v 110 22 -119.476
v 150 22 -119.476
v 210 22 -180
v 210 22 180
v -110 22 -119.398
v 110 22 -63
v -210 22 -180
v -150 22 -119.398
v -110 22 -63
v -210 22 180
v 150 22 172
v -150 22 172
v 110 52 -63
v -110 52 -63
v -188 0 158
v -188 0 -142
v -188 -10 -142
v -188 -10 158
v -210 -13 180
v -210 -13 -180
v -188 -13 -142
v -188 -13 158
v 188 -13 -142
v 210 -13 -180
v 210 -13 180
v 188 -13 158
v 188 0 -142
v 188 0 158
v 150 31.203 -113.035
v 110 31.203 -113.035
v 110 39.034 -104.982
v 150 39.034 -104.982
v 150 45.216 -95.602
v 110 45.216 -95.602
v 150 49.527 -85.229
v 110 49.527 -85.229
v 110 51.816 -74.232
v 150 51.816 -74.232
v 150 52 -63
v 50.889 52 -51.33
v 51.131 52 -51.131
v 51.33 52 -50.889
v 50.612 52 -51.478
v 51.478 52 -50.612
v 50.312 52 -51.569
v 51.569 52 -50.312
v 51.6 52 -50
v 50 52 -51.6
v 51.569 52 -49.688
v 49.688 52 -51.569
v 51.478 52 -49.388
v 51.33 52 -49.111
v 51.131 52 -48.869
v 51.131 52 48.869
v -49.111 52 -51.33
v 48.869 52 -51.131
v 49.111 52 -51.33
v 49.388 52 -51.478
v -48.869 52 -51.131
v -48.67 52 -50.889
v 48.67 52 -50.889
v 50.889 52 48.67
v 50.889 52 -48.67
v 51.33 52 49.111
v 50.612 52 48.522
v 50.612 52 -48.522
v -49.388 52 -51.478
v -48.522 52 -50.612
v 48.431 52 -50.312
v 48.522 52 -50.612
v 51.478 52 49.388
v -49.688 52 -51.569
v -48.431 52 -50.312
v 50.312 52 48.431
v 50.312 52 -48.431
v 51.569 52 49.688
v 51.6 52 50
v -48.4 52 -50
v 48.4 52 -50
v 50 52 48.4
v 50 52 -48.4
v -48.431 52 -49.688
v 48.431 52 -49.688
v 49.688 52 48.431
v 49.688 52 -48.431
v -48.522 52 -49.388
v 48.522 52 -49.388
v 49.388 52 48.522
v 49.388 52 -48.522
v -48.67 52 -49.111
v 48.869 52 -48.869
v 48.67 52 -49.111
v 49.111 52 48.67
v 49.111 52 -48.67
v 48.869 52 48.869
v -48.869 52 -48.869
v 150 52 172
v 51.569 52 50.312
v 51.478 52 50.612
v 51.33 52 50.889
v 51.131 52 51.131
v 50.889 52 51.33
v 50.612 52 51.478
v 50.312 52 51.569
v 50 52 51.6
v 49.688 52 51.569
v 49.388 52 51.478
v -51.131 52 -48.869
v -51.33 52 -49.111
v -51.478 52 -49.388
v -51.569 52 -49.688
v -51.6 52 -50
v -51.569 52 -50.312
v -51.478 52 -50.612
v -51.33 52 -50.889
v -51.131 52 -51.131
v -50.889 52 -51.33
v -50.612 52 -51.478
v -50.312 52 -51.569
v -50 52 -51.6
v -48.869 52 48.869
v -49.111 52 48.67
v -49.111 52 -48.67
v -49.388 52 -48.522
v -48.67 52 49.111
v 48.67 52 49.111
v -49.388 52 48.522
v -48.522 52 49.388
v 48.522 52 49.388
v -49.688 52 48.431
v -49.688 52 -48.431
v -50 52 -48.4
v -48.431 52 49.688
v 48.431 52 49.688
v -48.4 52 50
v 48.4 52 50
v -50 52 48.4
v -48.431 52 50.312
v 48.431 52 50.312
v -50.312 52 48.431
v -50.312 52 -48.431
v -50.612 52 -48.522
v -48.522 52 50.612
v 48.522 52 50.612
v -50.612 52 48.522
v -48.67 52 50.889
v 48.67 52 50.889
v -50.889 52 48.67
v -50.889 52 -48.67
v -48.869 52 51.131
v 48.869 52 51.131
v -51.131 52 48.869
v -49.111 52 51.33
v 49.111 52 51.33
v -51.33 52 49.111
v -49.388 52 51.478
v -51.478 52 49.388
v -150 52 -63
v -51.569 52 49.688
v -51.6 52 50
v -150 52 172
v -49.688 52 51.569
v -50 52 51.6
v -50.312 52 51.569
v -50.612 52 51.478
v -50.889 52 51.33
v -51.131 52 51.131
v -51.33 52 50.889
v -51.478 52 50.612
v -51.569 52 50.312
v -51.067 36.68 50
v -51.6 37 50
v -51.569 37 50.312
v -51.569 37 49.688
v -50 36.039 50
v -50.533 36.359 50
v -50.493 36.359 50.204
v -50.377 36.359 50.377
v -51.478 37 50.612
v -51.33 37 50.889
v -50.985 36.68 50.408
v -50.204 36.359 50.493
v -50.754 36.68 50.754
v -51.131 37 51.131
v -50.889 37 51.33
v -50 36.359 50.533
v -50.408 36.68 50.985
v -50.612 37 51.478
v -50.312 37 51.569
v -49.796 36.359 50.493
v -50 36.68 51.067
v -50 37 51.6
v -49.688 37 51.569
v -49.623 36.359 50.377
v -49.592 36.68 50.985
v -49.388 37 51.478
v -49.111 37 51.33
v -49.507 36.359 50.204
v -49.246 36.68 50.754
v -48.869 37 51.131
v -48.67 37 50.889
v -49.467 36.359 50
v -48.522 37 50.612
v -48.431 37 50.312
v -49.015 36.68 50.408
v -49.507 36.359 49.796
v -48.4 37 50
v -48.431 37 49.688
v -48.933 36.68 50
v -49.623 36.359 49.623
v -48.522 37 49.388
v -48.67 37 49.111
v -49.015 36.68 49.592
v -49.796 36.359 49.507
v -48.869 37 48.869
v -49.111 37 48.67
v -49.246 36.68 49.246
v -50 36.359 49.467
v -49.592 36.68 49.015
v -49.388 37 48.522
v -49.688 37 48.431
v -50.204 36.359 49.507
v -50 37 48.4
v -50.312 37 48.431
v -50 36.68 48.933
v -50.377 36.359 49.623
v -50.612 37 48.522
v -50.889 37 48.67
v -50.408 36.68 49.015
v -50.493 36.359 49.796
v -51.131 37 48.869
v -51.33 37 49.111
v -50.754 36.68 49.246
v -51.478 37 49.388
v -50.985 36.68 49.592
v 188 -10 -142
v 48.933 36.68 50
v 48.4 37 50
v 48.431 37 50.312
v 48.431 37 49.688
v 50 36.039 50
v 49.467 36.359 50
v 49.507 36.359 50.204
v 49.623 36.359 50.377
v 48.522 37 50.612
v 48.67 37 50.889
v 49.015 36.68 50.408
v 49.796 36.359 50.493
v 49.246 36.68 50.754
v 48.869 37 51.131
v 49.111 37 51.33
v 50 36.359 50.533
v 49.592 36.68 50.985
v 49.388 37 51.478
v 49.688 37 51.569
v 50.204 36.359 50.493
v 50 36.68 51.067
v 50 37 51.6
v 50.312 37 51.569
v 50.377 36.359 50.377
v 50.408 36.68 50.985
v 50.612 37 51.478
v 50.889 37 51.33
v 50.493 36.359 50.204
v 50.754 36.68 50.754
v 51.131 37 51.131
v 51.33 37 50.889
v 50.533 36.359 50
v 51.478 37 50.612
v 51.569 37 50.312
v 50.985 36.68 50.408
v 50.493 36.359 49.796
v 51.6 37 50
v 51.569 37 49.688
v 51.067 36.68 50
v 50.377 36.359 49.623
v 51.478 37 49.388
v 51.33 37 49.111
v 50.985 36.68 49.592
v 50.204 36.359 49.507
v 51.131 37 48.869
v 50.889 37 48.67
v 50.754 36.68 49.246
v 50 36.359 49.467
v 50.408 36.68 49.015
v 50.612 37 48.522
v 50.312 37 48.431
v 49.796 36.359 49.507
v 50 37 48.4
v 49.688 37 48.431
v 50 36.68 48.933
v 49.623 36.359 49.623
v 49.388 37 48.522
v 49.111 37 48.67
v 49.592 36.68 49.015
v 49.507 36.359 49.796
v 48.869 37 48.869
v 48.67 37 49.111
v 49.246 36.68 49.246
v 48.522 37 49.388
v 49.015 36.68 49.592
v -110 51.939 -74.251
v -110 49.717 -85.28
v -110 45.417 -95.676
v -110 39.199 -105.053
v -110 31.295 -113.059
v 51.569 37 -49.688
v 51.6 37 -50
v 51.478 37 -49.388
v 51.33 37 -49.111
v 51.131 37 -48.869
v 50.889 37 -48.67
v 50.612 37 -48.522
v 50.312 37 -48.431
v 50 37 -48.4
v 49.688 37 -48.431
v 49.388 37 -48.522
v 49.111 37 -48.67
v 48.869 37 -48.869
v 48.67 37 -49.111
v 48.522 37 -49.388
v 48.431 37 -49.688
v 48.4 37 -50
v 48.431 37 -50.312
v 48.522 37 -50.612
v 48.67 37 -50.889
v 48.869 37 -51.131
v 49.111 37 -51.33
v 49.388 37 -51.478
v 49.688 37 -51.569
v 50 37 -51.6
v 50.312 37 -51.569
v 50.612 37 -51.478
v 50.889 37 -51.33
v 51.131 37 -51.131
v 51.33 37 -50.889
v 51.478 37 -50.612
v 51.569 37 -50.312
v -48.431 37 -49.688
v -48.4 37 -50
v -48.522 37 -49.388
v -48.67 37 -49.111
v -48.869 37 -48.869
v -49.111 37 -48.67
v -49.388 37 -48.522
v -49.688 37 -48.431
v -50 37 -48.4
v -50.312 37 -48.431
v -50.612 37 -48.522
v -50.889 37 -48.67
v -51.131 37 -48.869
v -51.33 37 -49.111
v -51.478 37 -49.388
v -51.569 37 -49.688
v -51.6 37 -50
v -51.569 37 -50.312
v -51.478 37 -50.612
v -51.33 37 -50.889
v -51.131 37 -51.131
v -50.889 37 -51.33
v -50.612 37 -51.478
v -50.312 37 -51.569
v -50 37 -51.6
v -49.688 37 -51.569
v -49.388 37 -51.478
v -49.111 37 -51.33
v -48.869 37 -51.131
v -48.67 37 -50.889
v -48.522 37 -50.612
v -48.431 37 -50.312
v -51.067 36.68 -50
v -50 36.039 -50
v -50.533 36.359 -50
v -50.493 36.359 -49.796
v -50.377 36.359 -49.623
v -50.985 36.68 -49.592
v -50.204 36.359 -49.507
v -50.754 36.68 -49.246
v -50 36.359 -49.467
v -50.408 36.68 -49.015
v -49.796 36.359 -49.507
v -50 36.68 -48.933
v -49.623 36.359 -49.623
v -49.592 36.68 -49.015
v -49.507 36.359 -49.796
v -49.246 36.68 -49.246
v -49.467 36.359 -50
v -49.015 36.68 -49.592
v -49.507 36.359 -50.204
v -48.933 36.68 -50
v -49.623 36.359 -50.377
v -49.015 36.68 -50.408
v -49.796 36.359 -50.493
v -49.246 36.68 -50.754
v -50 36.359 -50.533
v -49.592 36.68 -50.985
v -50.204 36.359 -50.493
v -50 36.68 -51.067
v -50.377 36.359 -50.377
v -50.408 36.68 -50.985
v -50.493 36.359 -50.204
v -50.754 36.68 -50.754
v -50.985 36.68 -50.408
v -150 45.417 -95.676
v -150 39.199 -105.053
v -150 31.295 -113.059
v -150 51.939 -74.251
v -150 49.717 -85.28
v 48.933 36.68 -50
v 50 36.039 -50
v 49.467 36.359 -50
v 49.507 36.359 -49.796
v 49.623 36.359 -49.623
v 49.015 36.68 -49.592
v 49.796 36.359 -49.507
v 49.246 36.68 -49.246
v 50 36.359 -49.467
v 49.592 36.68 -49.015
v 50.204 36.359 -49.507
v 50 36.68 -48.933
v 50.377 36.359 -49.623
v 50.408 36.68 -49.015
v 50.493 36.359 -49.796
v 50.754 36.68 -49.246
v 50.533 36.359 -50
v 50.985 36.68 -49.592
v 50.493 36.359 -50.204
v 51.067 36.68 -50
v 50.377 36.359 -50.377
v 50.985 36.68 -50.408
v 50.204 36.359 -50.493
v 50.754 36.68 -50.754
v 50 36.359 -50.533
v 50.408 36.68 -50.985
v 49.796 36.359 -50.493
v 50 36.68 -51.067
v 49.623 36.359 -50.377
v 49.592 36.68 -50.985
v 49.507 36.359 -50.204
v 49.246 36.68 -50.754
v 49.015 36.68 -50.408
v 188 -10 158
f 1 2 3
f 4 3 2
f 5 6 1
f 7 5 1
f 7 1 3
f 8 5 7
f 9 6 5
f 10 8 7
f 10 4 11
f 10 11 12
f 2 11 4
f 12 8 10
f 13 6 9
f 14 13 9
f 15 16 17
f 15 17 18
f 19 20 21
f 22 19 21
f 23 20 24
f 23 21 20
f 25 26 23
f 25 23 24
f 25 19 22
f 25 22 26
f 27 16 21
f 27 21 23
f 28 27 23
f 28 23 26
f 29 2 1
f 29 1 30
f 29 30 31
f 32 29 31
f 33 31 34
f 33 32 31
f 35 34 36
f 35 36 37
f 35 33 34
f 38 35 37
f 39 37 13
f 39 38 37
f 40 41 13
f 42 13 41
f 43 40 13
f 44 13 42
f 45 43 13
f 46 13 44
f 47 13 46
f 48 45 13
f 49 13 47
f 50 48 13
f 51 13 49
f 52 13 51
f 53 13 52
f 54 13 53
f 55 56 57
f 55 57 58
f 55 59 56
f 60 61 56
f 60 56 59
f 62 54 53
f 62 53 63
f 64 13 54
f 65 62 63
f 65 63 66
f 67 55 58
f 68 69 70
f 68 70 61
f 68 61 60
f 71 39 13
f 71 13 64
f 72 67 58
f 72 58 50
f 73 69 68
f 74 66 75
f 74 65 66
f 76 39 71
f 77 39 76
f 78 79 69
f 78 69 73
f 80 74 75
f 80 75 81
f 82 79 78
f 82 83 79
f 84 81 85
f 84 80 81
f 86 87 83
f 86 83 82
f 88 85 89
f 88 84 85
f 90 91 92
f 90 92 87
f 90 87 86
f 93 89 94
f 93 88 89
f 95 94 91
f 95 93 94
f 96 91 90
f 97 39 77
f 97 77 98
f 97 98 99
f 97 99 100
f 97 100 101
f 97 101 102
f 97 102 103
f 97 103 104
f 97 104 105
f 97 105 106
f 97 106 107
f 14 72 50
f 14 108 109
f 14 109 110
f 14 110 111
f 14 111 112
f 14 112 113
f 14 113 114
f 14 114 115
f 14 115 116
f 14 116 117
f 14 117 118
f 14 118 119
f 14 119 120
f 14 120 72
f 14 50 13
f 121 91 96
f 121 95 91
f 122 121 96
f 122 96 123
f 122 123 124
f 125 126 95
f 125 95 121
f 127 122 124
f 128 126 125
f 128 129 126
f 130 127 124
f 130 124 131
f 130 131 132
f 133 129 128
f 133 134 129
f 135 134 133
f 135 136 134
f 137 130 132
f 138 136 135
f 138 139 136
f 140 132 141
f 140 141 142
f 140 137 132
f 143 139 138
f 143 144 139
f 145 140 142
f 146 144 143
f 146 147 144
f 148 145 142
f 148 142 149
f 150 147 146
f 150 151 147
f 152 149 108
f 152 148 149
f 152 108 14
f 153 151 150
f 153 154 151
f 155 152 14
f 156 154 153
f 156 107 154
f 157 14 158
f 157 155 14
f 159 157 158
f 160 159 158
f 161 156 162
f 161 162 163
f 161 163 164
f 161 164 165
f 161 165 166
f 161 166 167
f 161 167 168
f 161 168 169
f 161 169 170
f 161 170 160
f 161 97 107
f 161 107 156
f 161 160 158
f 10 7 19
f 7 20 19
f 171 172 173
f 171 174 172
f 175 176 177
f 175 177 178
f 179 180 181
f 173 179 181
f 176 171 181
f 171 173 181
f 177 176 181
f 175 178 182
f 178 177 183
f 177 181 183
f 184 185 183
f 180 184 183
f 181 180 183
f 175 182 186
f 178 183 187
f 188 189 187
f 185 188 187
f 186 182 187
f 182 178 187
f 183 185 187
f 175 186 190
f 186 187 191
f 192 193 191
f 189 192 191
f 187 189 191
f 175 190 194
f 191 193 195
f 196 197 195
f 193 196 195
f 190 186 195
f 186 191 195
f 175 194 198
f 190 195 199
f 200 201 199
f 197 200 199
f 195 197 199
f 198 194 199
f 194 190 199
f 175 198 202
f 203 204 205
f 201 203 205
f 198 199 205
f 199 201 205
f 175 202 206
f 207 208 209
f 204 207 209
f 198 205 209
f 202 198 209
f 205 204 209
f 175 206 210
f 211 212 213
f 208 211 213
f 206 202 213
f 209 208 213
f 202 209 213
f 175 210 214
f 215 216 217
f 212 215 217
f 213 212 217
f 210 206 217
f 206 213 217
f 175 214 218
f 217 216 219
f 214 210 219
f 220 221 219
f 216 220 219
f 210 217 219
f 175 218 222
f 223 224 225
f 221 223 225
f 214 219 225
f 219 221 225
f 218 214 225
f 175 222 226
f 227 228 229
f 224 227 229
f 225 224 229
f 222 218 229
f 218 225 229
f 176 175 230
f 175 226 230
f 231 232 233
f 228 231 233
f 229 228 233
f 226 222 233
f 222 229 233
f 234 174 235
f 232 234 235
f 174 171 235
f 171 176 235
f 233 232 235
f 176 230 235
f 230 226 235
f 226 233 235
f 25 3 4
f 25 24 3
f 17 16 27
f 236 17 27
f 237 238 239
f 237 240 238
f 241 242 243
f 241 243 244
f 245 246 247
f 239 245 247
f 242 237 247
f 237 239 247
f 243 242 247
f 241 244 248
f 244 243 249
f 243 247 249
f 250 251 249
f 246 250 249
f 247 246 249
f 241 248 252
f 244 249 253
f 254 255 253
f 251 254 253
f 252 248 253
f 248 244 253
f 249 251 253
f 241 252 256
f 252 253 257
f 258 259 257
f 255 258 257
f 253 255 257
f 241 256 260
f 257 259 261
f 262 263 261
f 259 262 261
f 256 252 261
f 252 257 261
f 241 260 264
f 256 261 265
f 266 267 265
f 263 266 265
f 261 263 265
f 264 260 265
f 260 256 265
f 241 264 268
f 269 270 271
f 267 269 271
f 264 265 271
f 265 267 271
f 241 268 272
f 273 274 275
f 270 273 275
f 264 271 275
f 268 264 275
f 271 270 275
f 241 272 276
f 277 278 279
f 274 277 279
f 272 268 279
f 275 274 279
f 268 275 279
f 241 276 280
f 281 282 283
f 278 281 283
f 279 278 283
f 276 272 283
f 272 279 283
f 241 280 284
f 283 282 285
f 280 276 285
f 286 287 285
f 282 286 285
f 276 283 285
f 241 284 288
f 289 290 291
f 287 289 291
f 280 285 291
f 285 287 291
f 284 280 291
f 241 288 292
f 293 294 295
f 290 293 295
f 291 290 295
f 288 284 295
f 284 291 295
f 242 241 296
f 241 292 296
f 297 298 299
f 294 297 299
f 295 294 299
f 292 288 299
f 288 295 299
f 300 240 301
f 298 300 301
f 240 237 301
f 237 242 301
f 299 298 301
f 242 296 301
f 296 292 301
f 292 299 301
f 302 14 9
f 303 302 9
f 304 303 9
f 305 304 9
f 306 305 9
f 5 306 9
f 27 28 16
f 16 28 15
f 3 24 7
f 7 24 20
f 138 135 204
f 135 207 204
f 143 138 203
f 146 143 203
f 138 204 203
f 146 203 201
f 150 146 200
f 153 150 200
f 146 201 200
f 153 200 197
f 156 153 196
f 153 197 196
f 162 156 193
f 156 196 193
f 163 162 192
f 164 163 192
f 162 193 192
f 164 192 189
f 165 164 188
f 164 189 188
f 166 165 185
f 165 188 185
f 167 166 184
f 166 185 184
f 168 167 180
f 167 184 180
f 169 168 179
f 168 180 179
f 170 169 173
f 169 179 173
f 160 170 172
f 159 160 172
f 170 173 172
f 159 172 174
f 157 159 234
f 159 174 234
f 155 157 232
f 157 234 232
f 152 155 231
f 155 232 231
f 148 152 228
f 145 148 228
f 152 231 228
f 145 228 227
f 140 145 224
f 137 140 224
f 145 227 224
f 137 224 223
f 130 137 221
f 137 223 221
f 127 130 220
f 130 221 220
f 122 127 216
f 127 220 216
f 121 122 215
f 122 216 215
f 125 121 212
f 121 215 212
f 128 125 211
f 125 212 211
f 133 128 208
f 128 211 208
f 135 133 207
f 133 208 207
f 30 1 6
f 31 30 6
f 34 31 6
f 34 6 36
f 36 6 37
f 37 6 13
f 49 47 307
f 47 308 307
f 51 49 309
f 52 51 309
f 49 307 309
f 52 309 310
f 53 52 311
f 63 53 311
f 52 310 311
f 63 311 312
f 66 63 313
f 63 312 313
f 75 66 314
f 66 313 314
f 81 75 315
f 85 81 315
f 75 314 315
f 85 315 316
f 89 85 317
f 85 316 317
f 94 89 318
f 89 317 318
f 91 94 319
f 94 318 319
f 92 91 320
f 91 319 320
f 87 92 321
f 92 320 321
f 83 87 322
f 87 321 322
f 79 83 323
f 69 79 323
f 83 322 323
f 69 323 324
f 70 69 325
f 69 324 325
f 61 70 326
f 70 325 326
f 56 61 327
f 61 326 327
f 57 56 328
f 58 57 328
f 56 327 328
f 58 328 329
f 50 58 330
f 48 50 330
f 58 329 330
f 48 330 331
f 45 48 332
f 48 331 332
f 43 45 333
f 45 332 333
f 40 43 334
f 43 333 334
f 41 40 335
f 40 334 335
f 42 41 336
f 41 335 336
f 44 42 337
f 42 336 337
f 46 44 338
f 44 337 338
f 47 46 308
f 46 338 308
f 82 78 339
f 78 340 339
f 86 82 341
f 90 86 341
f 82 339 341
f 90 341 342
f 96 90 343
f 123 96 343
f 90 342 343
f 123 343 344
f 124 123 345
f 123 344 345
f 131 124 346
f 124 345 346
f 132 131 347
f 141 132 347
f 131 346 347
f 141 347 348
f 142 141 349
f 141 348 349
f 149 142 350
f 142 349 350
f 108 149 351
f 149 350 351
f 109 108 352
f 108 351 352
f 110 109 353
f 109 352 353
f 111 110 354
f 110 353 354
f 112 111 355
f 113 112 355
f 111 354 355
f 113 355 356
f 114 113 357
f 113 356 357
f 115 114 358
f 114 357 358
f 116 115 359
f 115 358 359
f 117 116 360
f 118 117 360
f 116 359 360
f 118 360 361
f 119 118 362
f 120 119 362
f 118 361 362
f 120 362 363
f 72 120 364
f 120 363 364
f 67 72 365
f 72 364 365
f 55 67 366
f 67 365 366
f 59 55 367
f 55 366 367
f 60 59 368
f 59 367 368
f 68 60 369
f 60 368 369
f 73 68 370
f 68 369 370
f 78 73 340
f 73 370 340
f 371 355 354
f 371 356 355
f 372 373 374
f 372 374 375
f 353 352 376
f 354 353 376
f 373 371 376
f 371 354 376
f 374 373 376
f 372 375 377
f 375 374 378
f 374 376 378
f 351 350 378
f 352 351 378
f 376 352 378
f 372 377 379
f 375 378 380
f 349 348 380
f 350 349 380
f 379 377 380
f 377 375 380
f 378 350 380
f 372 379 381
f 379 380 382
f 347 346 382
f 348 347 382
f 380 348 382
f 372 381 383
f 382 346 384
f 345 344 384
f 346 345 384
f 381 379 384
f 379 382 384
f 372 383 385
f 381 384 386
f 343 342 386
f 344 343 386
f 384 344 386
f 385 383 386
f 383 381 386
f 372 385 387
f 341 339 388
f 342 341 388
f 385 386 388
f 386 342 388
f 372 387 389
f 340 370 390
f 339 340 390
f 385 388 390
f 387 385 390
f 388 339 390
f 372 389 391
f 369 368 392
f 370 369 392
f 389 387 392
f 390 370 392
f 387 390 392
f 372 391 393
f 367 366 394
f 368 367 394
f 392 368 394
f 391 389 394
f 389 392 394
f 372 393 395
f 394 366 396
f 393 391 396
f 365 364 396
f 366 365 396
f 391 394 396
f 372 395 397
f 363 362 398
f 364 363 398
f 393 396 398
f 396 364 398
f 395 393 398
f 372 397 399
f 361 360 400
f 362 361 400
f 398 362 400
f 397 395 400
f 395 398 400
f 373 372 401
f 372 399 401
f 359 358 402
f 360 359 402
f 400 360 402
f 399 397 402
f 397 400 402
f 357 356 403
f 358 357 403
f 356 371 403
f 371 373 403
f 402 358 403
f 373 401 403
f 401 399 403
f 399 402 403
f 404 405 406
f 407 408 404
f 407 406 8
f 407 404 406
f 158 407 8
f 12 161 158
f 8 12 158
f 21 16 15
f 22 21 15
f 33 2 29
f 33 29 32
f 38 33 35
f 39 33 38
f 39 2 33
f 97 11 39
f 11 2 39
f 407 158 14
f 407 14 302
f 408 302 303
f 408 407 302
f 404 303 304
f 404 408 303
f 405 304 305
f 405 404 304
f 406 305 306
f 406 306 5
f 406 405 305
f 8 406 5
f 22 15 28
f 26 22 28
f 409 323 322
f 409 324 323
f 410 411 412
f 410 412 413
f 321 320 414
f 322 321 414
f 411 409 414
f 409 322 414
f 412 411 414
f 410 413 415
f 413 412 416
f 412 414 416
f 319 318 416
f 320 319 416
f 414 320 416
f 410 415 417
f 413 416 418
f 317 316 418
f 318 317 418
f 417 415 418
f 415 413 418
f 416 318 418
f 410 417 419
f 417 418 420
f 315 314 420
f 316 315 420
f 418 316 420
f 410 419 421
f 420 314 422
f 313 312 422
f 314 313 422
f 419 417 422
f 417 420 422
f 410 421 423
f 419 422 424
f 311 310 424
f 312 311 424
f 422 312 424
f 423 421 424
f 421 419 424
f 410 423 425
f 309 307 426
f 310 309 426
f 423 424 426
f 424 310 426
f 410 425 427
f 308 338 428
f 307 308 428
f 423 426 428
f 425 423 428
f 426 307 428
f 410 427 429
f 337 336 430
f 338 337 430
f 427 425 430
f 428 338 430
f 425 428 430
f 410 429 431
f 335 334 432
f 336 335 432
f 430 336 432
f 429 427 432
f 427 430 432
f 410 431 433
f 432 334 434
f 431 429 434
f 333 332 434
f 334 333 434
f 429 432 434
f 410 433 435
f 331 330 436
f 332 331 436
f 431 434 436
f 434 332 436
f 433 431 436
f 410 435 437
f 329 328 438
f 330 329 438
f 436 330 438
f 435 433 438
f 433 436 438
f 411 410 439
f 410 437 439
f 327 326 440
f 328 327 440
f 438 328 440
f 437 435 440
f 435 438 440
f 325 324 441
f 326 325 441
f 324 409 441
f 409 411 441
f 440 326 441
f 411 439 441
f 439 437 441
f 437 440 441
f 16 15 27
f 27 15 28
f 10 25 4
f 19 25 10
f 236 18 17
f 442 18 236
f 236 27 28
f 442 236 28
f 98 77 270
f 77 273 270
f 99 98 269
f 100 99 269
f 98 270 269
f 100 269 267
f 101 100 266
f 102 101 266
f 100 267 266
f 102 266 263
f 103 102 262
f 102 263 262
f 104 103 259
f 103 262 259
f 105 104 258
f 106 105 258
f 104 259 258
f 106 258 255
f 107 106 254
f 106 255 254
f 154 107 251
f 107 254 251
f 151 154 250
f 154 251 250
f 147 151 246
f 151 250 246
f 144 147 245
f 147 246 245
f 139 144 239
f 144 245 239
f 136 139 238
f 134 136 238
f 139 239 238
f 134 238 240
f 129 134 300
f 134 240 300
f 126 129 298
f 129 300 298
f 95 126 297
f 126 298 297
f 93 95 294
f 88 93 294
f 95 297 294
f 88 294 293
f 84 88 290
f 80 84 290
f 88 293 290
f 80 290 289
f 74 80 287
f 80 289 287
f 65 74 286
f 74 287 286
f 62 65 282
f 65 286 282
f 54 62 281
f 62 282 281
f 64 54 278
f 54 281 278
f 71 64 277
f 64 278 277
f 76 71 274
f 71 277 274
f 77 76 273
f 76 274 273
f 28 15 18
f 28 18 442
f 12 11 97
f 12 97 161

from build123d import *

# Parameters (mm, degrees)
F0_W      = 420
F0_H      = 360
F0_W_2    = 376
F0_H_2    = 300
F1_DEPTH  = 13
F2_W      = 420
F2_H      = 360
F3_DEPTH  = 22
F4_W      = 376
F4_H      = 300
F5_DEPTH  = 10
F6_W      = 300
F6_H      = 235
F7_DEPTH  = 30
F9_DEPTH  = 40
F11_DEPTH = 40
F13_D     = 3.2
F13_DEPTH = 15
F13_TIP   = 0.9613769904


with BuildPart() as f1:
    # F0 (on Front) → F1 (new body)
    with BuildSketch(Plane.XZ):
        Rectangle(F0_W, F0_H)
        with Locations((0, 8)):
            Rectangle(F0_W_2, F0_H_2, mode=Mode.SUBTRACT)
    extrude(amount=F1_DEPTH)

    # F2 (on face) → F3 (join)
    with BuildSketch(Plane(origin=(0, 0, 0), x_dir=(-1, 0, 0), z_dir=(0, 1, 0))):
        Rectangle(F2_W, F2_H)
    extrude(amount=F3_DEPTH)

    # F6 (on face) → F7 (join)
    with BuildSketch(Plane(origin=(0, 22, 0), x_dir=(-1, 0, 0), z_dir=(0, 1, 0))):
        with Locations((0, 54.5)):
            Rectangle(F6_W, F6_H)
    extrude(amount=F7_DEPTH)

    # F8 (on face) → F9 (join)
    with BuildSketch(Plane.YZ.offset(150)):
        with BuildLine():
            Line((22, -63), (21.895647049, -119.5354834199))
            ThreePointArc((21.895647049, -119.5354834199), (45.1873930634, -95.6551970665), (52, -63))
            Line((52, -63), (22, -63))
        make_face()
    extrude(amount=-F9_DEPTH)

    # F10 (on face) → F11 (join)
    with BuildSketch(Plane(origin=(-150, 0, 0), x_dir=(0, -1, 0), z_dir=(-1, 0, 0))):
        with BuildLine():
            Line((-22, -63), (-52, -63))
            ThreePointArc((-52, -63), (-45.3931806107, -95.721706093), (-21.9098161906, -119.4470450282))
            Line((-21.9098161906, -119.4470450282), (-22, -63))
        make_face()
    extrude(amount=-F11_DEPTH)

    # F13
    with Locations(Plane(origin=(0, 52, 0), x_dir=(-1, 0, 0), z_dir=(0, 1, 0))):
        with Locations((-50, 50), (50, 50), (50, -50), (-50, -50)):
            Hole(F13_D / 2, depth=F13_DEPTH)
            with Locations((0, 0, -(F13_DEPTH + F13_TIP / 2))):  # 118° drill point
                Cone(0, F13_D / 2, F13_TIP, mode=Mode.SUBTRACT)


with BuildPart() as f5:
    # F4 (on face) → F5 (new body)
    with BuildSketch(Plane.XZ):
        with Locations((0, 8)):
            Rectangle(F4_W, F4_H)
    extrude(amount=F5_DEPTH)


solid = Compound([f1.part, f5.part])
